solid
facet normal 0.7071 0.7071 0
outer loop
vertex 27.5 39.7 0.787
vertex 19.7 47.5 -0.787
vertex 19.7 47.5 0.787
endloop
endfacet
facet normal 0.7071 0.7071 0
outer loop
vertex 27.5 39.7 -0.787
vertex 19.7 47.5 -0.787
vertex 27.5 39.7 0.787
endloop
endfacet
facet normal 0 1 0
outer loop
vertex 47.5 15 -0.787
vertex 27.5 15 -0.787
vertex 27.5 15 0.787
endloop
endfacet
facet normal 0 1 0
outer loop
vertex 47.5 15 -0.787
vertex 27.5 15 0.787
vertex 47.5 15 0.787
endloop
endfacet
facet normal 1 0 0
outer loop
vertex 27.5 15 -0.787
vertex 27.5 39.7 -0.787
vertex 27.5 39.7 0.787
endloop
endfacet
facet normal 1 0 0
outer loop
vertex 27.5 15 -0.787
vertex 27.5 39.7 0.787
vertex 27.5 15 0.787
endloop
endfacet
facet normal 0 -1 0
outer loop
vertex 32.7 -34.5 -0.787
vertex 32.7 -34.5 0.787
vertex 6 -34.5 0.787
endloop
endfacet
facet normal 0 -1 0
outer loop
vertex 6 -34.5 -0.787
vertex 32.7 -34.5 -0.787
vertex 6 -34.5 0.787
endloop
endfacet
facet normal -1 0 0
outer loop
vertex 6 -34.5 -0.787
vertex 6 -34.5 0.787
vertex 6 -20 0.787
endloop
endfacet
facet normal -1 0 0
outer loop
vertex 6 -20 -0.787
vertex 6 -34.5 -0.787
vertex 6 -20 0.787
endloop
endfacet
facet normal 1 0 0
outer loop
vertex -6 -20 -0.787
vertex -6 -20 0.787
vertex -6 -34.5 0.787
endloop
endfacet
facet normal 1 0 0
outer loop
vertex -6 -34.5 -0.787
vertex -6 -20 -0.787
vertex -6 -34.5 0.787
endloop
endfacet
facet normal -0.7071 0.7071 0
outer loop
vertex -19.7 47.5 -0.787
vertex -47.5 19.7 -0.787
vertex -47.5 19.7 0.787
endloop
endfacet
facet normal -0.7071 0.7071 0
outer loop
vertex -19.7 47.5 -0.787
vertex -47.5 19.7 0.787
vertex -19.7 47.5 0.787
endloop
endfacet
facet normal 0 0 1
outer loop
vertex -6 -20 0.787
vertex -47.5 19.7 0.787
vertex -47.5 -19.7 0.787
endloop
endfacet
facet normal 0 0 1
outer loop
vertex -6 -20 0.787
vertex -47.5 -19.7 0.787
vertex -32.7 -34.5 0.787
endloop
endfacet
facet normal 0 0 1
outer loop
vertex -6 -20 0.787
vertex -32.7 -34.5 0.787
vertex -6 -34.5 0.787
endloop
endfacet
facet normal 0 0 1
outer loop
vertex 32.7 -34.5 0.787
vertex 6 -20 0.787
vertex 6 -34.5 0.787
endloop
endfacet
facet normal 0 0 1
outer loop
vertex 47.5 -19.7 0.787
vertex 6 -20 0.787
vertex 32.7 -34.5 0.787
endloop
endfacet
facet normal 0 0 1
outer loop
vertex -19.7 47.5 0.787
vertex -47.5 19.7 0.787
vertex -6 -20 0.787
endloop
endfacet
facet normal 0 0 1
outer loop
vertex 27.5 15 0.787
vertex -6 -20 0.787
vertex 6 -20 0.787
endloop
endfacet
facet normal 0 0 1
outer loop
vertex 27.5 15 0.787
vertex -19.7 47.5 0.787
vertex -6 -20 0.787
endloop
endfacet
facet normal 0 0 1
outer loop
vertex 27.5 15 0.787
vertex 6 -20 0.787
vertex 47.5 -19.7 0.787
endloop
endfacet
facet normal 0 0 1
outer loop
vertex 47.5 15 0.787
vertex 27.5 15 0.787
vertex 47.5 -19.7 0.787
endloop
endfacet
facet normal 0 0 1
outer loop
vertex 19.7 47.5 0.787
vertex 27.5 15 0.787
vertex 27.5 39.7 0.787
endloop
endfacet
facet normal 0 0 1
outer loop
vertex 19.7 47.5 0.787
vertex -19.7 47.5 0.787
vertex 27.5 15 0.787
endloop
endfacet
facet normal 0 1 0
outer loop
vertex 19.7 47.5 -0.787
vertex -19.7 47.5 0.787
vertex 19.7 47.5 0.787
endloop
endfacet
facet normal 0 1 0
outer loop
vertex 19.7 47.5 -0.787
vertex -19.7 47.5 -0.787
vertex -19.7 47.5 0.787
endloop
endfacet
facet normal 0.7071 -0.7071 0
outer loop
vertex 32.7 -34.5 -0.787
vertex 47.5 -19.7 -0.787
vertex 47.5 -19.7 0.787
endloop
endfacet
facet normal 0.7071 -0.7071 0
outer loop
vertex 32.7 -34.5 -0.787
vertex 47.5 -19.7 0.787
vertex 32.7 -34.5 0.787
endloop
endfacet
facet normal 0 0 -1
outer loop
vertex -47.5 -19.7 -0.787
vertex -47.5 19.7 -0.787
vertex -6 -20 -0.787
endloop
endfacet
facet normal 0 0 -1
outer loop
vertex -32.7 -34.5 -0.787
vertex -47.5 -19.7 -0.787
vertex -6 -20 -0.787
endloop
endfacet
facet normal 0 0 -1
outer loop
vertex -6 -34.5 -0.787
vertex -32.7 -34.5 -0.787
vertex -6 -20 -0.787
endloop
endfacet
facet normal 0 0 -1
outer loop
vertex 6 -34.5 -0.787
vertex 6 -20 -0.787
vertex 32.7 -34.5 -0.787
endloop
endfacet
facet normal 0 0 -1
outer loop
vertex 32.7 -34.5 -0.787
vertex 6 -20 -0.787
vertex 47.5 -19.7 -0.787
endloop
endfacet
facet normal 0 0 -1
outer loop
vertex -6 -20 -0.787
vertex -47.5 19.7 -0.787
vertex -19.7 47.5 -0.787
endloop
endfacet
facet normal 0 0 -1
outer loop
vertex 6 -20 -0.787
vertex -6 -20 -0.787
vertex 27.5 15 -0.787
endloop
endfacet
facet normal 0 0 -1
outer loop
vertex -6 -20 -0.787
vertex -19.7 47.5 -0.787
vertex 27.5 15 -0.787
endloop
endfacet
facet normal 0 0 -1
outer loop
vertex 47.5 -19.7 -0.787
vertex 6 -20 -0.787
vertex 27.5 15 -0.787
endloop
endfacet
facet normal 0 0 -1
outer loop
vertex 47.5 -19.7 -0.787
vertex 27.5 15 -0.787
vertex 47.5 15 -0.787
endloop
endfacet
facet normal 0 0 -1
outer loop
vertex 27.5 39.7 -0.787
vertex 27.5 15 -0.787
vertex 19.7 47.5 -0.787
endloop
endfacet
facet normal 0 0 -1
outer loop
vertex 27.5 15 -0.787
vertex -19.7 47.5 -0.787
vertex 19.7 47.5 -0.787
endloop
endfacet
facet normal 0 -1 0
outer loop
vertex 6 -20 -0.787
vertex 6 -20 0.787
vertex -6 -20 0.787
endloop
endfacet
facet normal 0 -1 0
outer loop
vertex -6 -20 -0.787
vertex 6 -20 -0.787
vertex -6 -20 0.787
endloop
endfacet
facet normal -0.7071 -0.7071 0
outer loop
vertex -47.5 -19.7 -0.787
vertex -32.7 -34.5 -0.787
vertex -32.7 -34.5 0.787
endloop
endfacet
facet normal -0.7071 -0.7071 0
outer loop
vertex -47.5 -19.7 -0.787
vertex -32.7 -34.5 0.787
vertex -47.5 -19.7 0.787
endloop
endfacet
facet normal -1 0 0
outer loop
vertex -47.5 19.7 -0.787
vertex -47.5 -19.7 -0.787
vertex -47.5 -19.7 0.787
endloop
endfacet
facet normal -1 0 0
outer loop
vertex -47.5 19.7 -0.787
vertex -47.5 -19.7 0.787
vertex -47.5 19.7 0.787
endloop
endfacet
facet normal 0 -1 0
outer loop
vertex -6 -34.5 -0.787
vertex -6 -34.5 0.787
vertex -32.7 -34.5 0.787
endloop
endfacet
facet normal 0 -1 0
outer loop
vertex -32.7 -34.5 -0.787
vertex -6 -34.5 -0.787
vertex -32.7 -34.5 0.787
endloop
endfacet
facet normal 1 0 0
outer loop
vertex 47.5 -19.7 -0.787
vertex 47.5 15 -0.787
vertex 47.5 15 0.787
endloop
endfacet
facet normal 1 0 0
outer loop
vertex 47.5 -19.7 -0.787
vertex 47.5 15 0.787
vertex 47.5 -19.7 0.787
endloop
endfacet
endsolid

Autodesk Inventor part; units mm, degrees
ref_plane "YZ Plane" through (0, 0, 0) normal (1, 0, 0) x (0, 1, 0)
ref_plane "XZ Plane" through (0, 0, 0) normal (0, 1, 0) x (-1, 0, 0)
ref_plane "XY Plane" through (0, 0, 0) normal (0, 0, 1) x (1, 0, 0)
sketch "Sketch1" plane through (0, 0, 0) normal (0, 0, 1) x (1, 0, 0)
  line L0 (0, 0) -> (0, 24.8008)
  line L1 (0, 0) -> (23.5103, 0)
  line L2 (-19.7, 47.5) -> (19.7, 47.5)
  line L3 (47.5, 19.7) -> (47.5, -19.7)
  line L4 (19.7, -47.5) -> (-19.7, -47.5)
  line L5 (-47.5, -19.7) -> (-47.5, 19.7)
  line L6 (19.7, 47.5) -> (47.5, 19.7)
  line L7 (47.5, -19.7) -> (19.7, -47.5)
  line L8 (-19.7, -47.5) -> (-47.5, -19.7)
  line L9 (-47.5, 19.7) -> (-19.7, 47.5)
  point P0 (-47.5, 47.5)
  point P1 (47.5, -47.5)
  point P2 (47.5, 47.5)
  point P3 (-47.5, -47.5)
  dimension "d9" = 27.8
  dimension "d10" = 27.8
  dimension "d11" = 27.8
  dimension "d12" = 27.8
  dimension "d13" = 27.8
  dimension "d14" = 27.8
  dimension "d15" = 27.8
  dimension "d16" = 27.8
  dimension "d17" = 95
  dimension "d18" = 95
extrude "Extrusion1" add sketch "Sketch1" along normal mid plane 1.5748
sketch "Sketch4" plane through (0, 0, 0.7874) normal (0, 0, 1) x (1, 0, 0)
  line L0 (19.7, -47.5) -> (-19.7, -47.5) projected
  line L1 (-35, -47.5) -> (35, -47.5)
  line L2 (35, -47.5) -> (35, -34.5)
  line L3 (35, -34.5) -> (-35, -34.5)
  line L4 (-35, -34.5) -> (-35, -47.5)
  point P0 (12, -47.5)
  point P1 (0, 0)
  point P2 (0, -34.5)
  dimension "d24" = 13
  dimension "d25" = 70
extrude "Extrusion4" cut sketch "Sketch4" against normal through all
sketch "Sketch5" plane through (0, 0, 0.7874) normal (0, 0, 1) x (1, 0, 0)
  line L0 (-6, -47.5) -> (6, -47.5)
  line L1 (6, -47.5) -> (6, -20)
  line L2 (6, -20) -> (-6, -20)
  line L3 (-6, -20) -> (-6, -47.5)
  line L4 (0, 0) -> (0, -10.8647)
  dimension "d29" = 12
  dimension "d30" = 27.5
  dimension "d45" = 20
extrude "Extrusion5" cut sketch "Sketch5" against normal through all
sketch "Sketch7" plane through (0, 0, -0.7874) normal (0, 0, -1) x (-1, 0, 0)
  line L0 (-47.5, -19.7) -> (-47.5, 19.7) projected
  line L1 (-47.5, 40) -> (-27.5, 40)
  line L2 (-27.5, 40) -> (-27.5, 15)
  line L3 (-27.5, 15) -> (-47.5, 15)
  line L4 (-47.5, 15) -> (-47.5, 40)
  point P0 (0, 0)
  point P1 (-27.5, 27.5)
  point P2 (-27.5, 27.5)
  dimension "d37" = 25
  dimension "d38" = 20
  dimension "d46" = 15
extrude "Extrusion7" cut sketch "Sketch7" against normal through all
equation "\"d10\" = d9"
equation "\"d11\" = d9"
equation "\"d12\" = d11"
equation "\"d13\" = d9"
equation "\"d14\" = d13"
equation "\"d15\" = d9"
equation "\"d16\" = d15"
properties part number "Pb_TX_bot" material "Lead"
